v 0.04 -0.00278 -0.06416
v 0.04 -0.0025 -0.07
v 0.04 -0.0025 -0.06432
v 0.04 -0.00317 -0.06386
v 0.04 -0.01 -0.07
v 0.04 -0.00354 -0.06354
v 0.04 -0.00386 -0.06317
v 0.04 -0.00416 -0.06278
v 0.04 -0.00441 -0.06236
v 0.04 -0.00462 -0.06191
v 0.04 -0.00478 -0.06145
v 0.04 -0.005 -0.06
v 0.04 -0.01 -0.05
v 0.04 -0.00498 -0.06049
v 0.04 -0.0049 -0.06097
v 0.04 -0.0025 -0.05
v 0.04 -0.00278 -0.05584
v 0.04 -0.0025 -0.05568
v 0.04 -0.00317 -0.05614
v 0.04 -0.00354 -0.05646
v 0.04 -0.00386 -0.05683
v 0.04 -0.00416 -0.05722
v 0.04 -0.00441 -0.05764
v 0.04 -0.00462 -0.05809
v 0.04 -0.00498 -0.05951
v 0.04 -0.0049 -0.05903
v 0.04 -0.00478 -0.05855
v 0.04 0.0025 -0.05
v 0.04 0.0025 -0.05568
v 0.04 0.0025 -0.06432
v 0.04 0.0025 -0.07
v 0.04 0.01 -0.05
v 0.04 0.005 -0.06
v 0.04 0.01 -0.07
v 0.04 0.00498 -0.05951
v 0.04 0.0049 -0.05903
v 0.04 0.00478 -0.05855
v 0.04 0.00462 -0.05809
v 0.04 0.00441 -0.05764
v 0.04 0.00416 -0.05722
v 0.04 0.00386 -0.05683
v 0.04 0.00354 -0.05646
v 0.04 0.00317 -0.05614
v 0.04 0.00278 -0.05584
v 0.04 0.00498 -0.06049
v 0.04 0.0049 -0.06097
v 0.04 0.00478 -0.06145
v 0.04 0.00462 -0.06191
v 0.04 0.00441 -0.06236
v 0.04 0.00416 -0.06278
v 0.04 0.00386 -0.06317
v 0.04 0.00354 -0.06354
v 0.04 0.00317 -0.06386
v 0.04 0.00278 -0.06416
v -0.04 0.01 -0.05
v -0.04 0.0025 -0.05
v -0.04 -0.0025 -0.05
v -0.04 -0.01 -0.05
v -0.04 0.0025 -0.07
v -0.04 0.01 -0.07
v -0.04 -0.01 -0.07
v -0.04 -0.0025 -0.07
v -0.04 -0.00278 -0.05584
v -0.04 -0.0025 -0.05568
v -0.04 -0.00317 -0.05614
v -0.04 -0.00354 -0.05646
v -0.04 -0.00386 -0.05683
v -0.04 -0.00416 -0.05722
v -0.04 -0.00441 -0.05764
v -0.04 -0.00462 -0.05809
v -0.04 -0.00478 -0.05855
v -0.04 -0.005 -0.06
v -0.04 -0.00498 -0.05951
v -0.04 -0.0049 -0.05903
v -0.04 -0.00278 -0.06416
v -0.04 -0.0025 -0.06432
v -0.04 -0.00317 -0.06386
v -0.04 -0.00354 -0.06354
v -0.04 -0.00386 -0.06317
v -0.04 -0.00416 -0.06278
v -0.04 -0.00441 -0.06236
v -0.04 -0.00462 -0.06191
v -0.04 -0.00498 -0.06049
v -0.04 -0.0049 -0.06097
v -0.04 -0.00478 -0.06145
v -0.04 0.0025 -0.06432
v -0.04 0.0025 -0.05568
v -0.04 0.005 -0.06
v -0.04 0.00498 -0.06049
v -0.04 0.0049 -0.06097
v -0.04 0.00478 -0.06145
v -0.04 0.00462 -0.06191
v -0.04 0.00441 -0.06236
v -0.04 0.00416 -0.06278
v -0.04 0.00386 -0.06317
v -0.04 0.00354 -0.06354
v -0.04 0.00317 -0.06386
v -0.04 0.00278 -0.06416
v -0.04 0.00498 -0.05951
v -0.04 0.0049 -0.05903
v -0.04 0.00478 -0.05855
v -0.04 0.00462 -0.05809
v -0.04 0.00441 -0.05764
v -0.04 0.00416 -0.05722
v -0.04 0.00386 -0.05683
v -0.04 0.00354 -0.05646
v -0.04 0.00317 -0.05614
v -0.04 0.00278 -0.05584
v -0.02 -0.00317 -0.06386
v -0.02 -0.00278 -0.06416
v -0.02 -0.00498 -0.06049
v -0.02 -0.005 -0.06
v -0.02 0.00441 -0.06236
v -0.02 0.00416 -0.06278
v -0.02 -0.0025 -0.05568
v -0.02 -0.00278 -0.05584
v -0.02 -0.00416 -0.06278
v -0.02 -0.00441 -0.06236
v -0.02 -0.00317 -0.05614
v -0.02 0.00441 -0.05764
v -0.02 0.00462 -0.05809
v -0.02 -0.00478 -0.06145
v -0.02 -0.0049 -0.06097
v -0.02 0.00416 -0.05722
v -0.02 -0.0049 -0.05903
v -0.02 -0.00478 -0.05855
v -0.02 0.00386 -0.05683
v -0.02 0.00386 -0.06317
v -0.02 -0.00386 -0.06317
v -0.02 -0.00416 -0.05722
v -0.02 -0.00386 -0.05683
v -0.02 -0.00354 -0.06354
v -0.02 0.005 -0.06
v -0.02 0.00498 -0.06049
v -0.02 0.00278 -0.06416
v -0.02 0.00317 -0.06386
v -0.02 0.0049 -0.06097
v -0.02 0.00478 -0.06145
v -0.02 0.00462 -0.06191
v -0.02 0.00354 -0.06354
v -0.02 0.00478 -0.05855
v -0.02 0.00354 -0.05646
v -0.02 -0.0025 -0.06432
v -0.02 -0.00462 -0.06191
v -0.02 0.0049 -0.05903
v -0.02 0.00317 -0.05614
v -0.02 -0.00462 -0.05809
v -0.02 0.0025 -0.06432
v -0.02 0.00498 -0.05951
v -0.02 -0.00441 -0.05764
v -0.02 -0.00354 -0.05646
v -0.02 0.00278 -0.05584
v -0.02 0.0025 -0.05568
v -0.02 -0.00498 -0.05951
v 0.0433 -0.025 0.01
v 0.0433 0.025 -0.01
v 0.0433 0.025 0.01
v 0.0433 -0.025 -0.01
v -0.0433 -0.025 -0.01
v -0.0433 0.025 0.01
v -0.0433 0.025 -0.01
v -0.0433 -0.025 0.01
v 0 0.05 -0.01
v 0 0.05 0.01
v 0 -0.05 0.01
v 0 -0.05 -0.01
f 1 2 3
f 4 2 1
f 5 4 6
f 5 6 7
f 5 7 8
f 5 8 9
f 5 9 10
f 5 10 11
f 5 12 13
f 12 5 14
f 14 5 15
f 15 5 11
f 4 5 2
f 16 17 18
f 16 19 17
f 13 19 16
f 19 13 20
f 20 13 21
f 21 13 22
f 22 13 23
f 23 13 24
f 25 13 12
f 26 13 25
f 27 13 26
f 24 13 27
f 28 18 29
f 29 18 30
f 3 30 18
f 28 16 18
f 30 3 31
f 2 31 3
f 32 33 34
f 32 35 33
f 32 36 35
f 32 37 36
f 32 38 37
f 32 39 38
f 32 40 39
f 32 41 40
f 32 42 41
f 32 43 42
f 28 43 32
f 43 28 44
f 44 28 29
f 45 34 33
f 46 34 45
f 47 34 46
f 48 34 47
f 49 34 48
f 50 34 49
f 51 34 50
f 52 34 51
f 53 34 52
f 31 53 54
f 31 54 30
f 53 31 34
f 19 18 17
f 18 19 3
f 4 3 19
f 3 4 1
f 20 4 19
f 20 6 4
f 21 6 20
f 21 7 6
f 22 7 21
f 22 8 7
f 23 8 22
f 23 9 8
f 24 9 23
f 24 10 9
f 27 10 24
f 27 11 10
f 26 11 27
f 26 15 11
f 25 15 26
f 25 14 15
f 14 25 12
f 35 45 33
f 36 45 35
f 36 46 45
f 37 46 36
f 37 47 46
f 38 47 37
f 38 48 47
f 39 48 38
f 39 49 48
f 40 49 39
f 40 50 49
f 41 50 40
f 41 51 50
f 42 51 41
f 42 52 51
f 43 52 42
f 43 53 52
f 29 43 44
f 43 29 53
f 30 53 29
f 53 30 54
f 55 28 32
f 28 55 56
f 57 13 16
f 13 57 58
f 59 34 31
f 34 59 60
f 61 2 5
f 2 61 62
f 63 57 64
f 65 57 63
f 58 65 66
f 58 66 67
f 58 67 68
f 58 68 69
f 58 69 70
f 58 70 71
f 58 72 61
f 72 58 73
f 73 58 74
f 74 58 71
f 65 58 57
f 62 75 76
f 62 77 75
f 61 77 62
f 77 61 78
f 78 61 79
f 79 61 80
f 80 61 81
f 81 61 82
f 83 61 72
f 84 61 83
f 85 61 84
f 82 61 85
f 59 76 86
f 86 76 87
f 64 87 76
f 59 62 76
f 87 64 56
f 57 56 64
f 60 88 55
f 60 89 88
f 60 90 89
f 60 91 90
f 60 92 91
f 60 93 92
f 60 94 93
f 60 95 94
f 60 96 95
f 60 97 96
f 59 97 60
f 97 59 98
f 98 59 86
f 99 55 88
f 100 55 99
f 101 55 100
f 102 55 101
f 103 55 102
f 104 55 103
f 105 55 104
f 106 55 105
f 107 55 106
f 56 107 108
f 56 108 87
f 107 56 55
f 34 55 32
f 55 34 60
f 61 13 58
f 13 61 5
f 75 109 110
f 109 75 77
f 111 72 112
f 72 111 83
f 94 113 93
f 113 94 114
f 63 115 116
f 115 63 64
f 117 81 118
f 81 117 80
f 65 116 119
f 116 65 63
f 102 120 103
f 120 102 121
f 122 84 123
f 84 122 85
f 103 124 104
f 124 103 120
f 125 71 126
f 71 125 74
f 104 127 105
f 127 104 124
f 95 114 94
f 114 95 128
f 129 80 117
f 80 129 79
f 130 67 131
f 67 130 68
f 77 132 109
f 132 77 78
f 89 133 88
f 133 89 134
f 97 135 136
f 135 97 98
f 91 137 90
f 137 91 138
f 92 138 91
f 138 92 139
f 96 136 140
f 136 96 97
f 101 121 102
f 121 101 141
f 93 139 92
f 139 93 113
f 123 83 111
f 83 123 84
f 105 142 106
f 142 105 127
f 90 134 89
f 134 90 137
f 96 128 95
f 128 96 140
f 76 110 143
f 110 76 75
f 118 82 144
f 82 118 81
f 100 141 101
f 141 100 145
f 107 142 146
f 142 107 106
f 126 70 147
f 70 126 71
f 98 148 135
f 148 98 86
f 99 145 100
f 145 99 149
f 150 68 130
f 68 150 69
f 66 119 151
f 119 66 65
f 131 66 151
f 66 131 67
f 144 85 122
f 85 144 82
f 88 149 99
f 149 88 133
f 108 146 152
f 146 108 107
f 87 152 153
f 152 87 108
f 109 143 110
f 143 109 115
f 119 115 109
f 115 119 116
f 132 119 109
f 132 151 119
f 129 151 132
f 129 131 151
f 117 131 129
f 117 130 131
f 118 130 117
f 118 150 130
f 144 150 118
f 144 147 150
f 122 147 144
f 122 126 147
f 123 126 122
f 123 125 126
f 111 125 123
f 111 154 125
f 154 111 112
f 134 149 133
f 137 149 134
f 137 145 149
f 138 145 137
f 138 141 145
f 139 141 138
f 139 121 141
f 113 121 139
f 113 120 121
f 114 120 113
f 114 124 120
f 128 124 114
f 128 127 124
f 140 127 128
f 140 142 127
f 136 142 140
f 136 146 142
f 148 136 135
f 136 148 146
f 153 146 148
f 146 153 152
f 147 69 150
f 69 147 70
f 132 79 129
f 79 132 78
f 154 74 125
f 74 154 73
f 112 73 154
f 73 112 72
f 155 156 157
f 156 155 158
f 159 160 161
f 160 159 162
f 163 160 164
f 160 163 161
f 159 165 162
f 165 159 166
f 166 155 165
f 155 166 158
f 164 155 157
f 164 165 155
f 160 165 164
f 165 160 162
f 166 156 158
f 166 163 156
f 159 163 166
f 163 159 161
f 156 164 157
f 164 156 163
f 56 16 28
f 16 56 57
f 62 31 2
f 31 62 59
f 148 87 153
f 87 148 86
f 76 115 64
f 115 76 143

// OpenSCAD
module hex_collar() {
    rotate([0, 0, 90])
    cylinder(h=0.02, r=0.05, $fn=6);
}

module central_opening() {
    rotate([0, 0, 90])
    cylinder(h=0.02, r=0.02, $fn=64);
}

module shank() {
    difference() {
        cube([0.08, 0.02, 0.02], center=true);
        translate([-0.04, 0, 0])
            rotate([0, 90, 0])
            cylinder(h=0.02, r=0.005, $fn=64);
        translate([0.04, 0, 0])
            rotate([0, 90, 0])
            cylinder(h=0.02, r=0.005, $fn=64);
    }
}

module rib() {
    translate([0, 0, -0.01])
    cube([0.08, 0.005, 0.02], center=true);
}

module mechanical_fitting() {
    union() {
        translate([0, 0, 0.04])
            hex_collar();
        translate([0, 0, 0.04])
            central_opening();
        translate([0, 0, -0.01])
            shank();
        rib();
    }
}

translate([0, 0, -0.05])
mechanical_fitting();
